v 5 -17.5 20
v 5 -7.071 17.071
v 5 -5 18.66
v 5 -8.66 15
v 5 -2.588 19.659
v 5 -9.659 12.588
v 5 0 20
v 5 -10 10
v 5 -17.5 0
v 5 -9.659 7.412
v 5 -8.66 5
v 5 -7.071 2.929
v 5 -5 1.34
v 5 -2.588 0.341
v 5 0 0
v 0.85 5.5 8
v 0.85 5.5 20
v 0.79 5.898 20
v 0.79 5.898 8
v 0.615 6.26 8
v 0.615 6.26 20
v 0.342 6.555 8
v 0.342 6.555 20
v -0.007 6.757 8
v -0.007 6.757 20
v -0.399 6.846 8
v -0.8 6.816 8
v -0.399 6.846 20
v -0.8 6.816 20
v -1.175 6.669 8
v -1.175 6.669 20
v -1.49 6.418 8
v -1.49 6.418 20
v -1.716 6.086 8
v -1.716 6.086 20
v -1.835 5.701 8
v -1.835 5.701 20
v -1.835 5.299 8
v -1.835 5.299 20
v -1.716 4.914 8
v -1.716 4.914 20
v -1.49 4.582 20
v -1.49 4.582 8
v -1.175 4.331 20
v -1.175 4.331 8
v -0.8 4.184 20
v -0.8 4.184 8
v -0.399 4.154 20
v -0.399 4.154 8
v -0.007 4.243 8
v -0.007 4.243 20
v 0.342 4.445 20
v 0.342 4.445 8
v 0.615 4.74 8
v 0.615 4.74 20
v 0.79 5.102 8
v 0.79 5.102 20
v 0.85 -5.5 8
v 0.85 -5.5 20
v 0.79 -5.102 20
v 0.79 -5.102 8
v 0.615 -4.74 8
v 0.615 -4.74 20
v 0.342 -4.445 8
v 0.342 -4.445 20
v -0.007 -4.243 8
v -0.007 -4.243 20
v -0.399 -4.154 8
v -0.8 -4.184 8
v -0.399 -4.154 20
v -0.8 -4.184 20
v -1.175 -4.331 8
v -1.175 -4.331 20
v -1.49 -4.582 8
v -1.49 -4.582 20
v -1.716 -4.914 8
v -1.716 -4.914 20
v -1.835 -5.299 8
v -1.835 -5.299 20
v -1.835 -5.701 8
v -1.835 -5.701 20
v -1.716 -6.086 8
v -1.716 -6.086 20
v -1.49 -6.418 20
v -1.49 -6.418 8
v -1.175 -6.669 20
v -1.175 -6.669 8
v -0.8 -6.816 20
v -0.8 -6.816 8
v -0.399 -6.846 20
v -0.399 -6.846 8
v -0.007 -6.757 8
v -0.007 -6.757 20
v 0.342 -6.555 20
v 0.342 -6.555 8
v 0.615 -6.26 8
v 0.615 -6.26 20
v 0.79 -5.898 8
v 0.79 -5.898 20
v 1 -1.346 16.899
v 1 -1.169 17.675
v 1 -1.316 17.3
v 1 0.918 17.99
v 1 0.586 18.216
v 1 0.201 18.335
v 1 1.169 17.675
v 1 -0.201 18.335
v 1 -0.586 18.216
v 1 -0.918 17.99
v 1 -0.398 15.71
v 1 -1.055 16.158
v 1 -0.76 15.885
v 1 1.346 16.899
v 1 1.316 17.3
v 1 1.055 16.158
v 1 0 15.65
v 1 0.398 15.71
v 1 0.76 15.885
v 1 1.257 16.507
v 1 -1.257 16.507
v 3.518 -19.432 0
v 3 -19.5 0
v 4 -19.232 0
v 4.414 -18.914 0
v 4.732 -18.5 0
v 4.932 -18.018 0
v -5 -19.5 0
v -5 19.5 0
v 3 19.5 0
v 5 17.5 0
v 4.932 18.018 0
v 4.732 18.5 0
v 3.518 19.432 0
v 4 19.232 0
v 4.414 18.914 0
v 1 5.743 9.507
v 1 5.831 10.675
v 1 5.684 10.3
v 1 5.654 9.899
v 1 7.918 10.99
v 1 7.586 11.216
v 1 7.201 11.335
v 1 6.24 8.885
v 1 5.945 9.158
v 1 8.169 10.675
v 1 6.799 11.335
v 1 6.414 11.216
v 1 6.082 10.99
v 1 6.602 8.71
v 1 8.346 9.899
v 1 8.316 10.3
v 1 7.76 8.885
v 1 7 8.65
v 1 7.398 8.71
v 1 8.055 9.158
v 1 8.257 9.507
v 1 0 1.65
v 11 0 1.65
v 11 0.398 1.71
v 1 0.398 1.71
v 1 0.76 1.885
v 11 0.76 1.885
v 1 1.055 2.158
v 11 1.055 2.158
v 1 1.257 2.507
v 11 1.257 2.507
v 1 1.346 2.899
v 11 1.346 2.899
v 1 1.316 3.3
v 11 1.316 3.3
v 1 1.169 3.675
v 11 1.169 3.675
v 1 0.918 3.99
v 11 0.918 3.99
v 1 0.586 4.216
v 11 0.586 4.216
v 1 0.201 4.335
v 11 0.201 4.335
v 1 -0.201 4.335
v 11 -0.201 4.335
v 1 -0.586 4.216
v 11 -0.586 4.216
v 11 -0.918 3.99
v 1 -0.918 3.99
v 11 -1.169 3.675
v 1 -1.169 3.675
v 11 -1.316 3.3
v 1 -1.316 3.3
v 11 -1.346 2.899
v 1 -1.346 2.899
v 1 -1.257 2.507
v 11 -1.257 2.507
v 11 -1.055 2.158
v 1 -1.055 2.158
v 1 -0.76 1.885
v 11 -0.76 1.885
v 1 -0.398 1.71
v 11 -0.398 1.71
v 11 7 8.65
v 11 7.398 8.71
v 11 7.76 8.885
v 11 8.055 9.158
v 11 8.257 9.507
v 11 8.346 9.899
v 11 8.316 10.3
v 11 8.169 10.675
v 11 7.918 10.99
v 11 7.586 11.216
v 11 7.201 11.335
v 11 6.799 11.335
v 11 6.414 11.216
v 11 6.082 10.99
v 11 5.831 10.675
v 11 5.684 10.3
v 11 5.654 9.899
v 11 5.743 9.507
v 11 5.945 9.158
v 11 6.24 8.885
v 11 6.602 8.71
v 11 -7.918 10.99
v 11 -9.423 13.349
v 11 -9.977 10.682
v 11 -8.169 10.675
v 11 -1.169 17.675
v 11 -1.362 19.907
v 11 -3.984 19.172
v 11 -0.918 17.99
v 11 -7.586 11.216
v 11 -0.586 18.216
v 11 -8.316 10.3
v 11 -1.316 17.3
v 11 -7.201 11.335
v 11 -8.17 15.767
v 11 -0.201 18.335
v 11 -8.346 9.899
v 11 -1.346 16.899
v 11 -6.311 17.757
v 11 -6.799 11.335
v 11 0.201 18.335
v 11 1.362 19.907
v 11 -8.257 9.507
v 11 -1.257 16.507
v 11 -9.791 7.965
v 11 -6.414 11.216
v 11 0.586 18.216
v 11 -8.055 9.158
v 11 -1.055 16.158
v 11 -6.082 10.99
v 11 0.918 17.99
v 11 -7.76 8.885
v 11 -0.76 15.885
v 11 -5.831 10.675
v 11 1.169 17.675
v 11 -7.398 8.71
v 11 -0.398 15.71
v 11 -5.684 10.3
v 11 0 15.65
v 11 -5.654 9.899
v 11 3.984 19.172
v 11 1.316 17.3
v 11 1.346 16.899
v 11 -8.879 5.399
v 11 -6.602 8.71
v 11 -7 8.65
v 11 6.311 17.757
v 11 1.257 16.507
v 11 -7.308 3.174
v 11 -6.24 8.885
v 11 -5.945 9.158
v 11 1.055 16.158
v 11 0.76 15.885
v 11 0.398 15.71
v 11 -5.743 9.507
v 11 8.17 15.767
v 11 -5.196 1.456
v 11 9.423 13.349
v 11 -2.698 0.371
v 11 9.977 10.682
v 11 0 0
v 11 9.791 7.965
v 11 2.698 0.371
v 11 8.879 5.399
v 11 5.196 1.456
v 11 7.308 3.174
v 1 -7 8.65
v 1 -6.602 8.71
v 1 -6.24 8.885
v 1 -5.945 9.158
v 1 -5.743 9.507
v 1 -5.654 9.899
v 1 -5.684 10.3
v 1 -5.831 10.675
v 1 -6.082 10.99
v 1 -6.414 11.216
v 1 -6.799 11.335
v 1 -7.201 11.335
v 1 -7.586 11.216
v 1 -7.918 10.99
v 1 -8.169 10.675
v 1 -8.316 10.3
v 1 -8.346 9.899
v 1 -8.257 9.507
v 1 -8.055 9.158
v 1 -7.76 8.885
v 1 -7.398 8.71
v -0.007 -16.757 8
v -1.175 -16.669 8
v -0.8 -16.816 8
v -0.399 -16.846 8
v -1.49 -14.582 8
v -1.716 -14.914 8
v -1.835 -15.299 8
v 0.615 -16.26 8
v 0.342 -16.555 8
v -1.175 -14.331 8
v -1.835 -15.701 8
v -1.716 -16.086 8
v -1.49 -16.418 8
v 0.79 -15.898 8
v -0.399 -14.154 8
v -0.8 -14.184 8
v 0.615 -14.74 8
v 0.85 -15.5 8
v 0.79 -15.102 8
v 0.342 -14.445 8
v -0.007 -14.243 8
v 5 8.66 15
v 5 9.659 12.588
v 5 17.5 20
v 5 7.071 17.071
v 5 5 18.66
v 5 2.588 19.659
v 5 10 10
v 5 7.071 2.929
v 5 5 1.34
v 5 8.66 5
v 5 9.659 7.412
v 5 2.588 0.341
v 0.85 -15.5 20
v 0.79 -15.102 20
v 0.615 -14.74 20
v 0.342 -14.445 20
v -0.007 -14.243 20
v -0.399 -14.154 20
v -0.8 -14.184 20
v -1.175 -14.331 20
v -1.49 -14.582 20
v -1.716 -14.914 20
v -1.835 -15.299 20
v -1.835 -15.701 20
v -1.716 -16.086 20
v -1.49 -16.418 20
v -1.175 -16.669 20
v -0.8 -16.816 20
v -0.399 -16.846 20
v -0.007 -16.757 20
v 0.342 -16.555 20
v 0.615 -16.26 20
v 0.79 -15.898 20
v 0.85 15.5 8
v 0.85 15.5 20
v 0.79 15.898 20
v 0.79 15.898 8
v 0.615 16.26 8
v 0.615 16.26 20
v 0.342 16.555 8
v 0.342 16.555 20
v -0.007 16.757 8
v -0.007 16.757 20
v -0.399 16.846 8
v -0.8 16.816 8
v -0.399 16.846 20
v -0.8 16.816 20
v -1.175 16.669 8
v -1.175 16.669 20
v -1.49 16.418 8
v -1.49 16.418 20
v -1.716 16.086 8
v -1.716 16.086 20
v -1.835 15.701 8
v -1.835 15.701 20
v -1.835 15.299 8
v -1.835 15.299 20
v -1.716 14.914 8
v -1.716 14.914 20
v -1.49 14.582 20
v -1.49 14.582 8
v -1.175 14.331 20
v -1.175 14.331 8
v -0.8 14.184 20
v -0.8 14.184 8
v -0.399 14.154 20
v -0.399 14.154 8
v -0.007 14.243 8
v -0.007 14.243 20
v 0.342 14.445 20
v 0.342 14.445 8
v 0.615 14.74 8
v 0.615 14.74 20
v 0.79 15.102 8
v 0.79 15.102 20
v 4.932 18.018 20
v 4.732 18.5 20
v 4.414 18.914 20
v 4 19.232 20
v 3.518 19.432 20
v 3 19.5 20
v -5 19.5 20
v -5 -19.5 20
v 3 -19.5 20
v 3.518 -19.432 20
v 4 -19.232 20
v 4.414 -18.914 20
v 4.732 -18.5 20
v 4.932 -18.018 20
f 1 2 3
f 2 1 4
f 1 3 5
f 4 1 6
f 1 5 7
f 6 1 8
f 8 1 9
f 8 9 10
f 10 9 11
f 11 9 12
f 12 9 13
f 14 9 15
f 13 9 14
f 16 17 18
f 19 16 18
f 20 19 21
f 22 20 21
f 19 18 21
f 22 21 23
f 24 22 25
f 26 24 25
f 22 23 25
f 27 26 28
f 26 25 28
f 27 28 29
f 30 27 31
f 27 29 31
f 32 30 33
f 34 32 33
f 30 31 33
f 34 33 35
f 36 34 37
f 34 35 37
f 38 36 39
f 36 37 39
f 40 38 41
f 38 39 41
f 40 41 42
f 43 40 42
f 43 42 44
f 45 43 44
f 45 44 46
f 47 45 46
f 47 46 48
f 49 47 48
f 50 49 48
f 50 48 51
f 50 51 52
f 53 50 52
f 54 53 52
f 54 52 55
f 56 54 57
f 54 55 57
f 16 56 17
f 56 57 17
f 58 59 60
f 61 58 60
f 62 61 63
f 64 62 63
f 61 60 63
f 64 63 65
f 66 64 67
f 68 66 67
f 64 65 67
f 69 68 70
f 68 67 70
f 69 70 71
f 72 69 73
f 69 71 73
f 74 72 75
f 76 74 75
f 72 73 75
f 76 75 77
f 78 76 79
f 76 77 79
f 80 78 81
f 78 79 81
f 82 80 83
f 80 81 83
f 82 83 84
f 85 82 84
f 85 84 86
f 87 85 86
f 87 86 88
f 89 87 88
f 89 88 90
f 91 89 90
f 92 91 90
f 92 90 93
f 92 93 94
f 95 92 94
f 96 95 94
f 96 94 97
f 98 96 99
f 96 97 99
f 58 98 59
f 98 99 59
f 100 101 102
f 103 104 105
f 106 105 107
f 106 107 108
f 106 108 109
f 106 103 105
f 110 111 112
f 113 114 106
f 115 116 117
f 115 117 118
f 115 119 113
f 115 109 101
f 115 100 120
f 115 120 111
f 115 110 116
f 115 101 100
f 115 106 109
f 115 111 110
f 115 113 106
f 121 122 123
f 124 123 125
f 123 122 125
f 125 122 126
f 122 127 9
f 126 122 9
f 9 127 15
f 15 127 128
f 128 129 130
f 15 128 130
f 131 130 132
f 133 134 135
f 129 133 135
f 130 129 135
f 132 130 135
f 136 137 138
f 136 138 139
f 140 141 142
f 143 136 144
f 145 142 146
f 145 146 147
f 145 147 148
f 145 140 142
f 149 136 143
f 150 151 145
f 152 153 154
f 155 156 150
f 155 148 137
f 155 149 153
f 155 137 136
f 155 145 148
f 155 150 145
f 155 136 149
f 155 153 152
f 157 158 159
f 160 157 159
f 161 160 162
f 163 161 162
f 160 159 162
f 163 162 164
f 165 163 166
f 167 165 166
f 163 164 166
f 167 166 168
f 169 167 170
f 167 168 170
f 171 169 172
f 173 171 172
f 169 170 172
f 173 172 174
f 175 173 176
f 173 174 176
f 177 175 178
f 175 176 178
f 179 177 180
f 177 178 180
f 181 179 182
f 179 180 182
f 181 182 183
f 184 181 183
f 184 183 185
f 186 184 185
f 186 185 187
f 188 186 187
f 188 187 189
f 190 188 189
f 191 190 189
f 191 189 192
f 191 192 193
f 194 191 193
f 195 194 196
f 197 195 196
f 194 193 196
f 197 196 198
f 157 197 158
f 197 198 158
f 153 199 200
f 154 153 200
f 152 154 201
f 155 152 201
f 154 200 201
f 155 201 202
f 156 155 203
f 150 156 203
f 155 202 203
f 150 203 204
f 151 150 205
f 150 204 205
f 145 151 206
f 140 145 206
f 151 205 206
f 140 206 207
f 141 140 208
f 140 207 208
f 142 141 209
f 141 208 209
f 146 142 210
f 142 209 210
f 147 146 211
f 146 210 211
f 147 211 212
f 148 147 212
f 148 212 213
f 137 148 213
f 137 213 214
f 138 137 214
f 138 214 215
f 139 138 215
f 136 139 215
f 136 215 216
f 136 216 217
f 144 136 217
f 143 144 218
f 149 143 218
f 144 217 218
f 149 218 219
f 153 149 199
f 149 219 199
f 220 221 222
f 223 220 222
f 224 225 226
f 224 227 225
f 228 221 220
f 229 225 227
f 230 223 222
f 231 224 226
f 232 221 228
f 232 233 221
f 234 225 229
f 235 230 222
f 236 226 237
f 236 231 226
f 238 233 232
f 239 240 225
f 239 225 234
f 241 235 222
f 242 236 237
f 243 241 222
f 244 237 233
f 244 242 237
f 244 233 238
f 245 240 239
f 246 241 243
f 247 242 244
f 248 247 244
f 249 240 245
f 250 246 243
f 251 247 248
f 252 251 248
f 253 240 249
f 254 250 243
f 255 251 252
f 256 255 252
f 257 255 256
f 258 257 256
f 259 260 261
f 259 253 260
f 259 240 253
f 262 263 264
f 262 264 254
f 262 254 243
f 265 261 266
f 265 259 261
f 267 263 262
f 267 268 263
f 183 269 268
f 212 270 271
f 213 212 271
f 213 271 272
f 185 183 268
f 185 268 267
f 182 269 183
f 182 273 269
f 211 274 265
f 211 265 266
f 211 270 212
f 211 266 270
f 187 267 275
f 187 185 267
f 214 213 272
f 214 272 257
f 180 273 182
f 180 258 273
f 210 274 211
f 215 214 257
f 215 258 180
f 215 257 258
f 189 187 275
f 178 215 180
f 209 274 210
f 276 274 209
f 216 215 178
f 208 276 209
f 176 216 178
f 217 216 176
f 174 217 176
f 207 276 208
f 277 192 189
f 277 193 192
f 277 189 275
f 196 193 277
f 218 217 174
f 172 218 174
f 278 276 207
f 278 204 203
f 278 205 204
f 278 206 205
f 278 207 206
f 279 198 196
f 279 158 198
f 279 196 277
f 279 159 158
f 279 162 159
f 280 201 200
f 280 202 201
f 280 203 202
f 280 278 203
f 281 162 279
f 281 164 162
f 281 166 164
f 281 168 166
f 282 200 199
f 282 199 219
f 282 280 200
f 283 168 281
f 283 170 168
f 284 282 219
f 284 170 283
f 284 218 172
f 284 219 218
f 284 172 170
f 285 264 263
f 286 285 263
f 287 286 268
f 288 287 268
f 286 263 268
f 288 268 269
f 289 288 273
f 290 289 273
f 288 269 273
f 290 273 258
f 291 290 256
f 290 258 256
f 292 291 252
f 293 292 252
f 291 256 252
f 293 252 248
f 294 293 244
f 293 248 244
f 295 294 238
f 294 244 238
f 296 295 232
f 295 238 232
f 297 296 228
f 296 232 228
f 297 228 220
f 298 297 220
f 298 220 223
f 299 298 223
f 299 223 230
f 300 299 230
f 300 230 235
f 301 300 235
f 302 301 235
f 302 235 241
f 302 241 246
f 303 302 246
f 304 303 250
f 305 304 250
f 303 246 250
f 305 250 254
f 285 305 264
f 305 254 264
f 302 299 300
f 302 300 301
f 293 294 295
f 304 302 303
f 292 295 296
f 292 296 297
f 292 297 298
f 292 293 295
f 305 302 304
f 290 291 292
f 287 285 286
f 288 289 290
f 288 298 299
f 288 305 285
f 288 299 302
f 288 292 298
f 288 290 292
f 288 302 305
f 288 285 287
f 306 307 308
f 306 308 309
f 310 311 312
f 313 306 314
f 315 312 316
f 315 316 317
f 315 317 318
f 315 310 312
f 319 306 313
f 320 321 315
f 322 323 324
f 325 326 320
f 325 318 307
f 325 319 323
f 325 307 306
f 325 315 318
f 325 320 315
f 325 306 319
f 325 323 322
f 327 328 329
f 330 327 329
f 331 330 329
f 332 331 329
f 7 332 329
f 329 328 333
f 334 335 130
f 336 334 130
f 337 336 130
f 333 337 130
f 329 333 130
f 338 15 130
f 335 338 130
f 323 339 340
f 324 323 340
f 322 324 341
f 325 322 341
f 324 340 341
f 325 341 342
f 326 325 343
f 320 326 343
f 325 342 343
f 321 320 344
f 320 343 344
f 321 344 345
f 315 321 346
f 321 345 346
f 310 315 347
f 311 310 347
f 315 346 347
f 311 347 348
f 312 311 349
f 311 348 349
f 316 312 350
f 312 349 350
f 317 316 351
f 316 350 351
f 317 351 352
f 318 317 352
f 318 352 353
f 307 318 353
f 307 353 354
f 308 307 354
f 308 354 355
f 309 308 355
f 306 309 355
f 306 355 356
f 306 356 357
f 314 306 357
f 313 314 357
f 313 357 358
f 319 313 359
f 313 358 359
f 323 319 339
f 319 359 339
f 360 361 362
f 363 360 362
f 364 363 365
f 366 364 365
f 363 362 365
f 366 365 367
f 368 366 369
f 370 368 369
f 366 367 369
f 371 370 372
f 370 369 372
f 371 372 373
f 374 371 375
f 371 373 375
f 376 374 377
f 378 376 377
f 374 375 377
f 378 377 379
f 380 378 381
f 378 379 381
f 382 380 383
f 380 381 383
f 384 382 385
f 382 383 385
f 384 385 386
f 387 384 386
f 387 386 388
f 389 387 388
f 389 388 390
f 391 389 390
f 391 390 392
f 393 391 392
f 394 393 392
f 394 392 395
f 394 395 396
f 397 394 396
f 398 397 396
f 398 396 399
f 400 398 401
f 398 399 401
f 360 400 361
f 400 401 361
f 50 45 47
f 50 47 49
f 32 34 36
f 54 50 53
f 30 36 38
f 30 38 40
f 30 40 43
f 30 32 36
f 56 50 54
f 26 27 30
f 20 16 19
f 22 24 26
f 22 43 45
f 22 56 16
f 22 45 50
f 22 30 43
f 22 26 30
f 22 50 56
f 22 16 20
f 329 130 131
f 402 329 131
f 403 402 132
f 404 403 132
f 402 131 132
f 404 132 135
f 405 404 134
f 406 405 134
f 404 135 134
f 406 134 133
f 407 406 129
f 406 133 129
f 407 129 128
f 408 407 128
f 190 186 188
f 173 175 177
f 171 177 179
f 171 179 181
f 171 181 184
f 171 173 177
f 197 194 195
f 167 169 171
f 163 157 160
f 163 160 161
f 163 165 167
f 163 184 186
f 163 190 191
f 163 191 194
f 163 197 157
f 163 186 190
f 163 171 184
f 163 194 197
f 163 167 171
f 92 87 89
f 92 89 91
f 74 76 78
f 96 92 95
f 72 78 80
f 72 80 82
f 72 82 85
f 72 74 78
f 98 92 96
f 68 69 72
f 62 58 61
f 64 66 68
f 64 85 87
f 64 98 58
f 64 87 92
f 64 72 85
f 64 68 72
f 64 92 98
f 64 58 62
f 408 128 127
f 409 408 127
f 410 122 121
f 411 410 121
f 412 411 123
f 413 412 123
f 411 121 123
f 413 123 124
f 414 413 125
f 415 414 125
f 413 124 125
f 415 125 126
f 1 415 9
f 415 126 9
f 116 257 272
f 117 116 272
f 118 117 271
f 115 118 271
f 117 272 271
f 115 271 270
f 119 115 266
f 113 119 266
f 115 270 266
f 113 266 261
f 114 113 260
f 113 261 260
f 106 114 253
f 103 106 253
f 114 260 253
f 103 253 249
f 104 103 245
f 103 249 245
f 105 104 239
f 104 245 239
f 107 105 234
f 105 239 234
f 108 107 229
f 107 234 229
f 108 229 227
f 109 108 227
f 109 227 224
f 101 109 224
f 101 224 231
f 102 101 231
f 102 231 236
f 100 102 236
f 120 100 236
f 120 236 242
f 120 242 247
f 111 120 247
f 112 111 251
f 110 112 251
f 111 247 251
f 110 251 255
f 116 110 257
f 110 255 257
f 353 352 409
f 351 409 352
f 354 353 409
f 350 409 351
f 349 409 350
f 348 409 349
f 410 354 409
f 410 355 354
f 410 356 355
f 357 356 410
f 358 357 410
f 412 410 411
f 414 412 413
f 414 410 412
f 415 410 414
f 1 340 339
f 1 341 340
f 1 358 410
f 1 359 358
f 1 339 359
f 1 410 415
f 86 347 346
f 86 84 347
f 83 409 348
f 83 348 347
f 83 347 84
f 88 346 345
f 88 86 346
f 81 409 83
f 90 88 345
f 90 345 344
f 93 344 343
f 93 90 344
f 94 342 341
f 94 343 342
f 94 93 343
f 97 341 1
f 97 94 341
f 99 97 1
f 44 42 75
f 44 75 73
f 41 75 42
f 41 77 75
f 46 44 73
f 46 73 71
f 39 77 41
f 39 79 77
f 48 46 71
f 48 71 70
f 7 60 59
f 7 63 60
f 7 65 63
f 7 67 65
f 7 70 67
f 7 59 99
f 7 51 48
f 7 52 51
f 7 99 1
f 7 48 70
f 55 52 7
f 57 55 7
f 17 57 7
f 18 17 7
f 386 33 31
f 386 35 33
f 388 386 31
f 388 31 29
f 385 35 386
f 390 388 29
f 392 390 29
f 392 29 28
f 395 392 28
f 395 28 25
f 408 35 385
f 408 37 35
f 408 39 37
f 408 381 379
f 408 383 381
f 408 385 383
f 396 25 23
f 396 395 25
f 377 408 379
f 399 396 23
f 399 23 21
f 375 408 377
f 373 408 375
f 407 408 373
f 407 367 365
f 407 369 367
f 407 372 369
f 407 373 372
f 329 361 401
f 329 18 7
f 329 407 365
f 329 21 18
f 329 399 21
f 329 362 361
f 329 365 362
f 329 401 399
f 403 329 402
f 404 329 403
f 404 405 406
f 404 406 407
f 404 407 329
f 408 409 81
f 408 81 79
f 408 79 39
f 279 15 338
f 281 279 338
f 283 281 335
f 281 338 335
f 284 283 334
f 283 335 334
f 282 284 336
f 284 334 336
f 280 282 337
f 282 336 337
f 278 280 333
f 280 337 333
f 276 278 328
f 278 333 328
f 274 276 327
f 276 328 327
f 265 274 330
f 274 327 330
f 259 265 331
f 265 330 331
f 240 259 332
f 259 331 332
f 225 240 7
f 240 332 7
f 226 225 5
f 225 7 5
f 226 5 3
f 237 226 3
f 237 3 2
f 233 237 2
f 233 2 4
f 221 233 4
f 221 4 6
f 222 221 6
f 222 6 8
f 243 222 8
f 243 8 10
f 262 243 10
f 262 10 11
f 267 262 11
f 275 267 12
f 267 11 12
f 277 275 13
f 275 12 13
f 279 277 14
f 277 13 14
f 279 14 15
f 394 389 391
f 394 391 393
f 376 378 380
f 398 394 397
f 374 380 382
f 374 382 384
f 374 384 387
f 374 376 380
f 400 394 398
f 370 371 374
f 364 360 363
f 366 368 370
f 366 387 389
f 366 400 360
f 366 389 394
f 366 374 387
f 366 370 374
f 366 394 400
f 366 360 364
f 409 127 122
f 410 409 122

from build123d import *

# Parameters (mm, degrees)
BOSS_EXTRUDE1_DEPTH = 20
SKETCH2_R           = 1.35
CUT_EXTRUDE2_DEPTH  = 12
SKETCH3_R           = 10
BOSS_EXTRUDE2_DEPTH = 6
SKETCH4_R           = 1.35
CUT_EXTRUDE3_DEPTH  = 10


with BuildPart() as part:
    # Sketch1 → Boss-Extrude1 (new body)
    with BuildSketch(Plane.XY):
        with BuildLine():
            Line((-5, -19.5), (3, -19.5))
            ThreePointArc((3, -19.5), (4.414213562, -18.914213562), (5, -17.5))
            Line((5, -17.5), (5, 17.5))
            ThreePointArc((5, 17.5), (4.414213562, 18.914213562), (3, 19.5))
            Line((3, 19.5), (-5, 19.5))
            Line((-5, 19.5), (-5, -19.5))
        make_face()
    extrude(amount=BOSS_EXTRUDE1_DEPTH)

    # Sketch2 → Cut-Extrude2 (cut)
    with BuildSketch(Plane.XY.offset(20)):
        with Locations((-0.5, 15.5)):
            Circle(SKETCH2_R)
        with Locations((-0.5, 5.5)):
            Circle(SKETCH2_R)
        with Locations((-0.5, -15.5)):
            Circle(SKETCH2_R)
        with Locations((-0.5, -5.5)):
            Circle(SKETCH2_R)
    extrude(amount=-CUT_EXTRUDE2_DEPTH, mode=Mode.SUBTRACT)

    # Sketch3 → Boss-Extrude2 (add)
    with BuildSketch(Plane(origin=(5, 0, 0), x_dir=(0, 0, -1), z_dir=(1, 0, 0))):
        with Locations((-10, 0)):
            Circle(SKETCH3_R)
    extrude(amount=BOSS_EXTRUDE2_DEPTH)

    # Sketch4 → Cut-Extrude3 (cut)
    with BuildSketch(Plane(origin=(11, 0, 0), x_dir=(0, 0, -1), z_dir=(1, 0, 0))):
        with Locations((-17, 0)):
            Circle(SKETCH4_R)
        with Locations((-10, 7)):
            Circle(SKETCH4_R)
        with Locations((-3, 0)):
            Circle(SKETCH4_R)
        with Locations((-10, -7)):
            Circle(SKETCH4_R)
    extrude(amount=-CUT_EXTRUDE3_DEPTH, mode=Mode.SUBTRACT)


solid = part.part
